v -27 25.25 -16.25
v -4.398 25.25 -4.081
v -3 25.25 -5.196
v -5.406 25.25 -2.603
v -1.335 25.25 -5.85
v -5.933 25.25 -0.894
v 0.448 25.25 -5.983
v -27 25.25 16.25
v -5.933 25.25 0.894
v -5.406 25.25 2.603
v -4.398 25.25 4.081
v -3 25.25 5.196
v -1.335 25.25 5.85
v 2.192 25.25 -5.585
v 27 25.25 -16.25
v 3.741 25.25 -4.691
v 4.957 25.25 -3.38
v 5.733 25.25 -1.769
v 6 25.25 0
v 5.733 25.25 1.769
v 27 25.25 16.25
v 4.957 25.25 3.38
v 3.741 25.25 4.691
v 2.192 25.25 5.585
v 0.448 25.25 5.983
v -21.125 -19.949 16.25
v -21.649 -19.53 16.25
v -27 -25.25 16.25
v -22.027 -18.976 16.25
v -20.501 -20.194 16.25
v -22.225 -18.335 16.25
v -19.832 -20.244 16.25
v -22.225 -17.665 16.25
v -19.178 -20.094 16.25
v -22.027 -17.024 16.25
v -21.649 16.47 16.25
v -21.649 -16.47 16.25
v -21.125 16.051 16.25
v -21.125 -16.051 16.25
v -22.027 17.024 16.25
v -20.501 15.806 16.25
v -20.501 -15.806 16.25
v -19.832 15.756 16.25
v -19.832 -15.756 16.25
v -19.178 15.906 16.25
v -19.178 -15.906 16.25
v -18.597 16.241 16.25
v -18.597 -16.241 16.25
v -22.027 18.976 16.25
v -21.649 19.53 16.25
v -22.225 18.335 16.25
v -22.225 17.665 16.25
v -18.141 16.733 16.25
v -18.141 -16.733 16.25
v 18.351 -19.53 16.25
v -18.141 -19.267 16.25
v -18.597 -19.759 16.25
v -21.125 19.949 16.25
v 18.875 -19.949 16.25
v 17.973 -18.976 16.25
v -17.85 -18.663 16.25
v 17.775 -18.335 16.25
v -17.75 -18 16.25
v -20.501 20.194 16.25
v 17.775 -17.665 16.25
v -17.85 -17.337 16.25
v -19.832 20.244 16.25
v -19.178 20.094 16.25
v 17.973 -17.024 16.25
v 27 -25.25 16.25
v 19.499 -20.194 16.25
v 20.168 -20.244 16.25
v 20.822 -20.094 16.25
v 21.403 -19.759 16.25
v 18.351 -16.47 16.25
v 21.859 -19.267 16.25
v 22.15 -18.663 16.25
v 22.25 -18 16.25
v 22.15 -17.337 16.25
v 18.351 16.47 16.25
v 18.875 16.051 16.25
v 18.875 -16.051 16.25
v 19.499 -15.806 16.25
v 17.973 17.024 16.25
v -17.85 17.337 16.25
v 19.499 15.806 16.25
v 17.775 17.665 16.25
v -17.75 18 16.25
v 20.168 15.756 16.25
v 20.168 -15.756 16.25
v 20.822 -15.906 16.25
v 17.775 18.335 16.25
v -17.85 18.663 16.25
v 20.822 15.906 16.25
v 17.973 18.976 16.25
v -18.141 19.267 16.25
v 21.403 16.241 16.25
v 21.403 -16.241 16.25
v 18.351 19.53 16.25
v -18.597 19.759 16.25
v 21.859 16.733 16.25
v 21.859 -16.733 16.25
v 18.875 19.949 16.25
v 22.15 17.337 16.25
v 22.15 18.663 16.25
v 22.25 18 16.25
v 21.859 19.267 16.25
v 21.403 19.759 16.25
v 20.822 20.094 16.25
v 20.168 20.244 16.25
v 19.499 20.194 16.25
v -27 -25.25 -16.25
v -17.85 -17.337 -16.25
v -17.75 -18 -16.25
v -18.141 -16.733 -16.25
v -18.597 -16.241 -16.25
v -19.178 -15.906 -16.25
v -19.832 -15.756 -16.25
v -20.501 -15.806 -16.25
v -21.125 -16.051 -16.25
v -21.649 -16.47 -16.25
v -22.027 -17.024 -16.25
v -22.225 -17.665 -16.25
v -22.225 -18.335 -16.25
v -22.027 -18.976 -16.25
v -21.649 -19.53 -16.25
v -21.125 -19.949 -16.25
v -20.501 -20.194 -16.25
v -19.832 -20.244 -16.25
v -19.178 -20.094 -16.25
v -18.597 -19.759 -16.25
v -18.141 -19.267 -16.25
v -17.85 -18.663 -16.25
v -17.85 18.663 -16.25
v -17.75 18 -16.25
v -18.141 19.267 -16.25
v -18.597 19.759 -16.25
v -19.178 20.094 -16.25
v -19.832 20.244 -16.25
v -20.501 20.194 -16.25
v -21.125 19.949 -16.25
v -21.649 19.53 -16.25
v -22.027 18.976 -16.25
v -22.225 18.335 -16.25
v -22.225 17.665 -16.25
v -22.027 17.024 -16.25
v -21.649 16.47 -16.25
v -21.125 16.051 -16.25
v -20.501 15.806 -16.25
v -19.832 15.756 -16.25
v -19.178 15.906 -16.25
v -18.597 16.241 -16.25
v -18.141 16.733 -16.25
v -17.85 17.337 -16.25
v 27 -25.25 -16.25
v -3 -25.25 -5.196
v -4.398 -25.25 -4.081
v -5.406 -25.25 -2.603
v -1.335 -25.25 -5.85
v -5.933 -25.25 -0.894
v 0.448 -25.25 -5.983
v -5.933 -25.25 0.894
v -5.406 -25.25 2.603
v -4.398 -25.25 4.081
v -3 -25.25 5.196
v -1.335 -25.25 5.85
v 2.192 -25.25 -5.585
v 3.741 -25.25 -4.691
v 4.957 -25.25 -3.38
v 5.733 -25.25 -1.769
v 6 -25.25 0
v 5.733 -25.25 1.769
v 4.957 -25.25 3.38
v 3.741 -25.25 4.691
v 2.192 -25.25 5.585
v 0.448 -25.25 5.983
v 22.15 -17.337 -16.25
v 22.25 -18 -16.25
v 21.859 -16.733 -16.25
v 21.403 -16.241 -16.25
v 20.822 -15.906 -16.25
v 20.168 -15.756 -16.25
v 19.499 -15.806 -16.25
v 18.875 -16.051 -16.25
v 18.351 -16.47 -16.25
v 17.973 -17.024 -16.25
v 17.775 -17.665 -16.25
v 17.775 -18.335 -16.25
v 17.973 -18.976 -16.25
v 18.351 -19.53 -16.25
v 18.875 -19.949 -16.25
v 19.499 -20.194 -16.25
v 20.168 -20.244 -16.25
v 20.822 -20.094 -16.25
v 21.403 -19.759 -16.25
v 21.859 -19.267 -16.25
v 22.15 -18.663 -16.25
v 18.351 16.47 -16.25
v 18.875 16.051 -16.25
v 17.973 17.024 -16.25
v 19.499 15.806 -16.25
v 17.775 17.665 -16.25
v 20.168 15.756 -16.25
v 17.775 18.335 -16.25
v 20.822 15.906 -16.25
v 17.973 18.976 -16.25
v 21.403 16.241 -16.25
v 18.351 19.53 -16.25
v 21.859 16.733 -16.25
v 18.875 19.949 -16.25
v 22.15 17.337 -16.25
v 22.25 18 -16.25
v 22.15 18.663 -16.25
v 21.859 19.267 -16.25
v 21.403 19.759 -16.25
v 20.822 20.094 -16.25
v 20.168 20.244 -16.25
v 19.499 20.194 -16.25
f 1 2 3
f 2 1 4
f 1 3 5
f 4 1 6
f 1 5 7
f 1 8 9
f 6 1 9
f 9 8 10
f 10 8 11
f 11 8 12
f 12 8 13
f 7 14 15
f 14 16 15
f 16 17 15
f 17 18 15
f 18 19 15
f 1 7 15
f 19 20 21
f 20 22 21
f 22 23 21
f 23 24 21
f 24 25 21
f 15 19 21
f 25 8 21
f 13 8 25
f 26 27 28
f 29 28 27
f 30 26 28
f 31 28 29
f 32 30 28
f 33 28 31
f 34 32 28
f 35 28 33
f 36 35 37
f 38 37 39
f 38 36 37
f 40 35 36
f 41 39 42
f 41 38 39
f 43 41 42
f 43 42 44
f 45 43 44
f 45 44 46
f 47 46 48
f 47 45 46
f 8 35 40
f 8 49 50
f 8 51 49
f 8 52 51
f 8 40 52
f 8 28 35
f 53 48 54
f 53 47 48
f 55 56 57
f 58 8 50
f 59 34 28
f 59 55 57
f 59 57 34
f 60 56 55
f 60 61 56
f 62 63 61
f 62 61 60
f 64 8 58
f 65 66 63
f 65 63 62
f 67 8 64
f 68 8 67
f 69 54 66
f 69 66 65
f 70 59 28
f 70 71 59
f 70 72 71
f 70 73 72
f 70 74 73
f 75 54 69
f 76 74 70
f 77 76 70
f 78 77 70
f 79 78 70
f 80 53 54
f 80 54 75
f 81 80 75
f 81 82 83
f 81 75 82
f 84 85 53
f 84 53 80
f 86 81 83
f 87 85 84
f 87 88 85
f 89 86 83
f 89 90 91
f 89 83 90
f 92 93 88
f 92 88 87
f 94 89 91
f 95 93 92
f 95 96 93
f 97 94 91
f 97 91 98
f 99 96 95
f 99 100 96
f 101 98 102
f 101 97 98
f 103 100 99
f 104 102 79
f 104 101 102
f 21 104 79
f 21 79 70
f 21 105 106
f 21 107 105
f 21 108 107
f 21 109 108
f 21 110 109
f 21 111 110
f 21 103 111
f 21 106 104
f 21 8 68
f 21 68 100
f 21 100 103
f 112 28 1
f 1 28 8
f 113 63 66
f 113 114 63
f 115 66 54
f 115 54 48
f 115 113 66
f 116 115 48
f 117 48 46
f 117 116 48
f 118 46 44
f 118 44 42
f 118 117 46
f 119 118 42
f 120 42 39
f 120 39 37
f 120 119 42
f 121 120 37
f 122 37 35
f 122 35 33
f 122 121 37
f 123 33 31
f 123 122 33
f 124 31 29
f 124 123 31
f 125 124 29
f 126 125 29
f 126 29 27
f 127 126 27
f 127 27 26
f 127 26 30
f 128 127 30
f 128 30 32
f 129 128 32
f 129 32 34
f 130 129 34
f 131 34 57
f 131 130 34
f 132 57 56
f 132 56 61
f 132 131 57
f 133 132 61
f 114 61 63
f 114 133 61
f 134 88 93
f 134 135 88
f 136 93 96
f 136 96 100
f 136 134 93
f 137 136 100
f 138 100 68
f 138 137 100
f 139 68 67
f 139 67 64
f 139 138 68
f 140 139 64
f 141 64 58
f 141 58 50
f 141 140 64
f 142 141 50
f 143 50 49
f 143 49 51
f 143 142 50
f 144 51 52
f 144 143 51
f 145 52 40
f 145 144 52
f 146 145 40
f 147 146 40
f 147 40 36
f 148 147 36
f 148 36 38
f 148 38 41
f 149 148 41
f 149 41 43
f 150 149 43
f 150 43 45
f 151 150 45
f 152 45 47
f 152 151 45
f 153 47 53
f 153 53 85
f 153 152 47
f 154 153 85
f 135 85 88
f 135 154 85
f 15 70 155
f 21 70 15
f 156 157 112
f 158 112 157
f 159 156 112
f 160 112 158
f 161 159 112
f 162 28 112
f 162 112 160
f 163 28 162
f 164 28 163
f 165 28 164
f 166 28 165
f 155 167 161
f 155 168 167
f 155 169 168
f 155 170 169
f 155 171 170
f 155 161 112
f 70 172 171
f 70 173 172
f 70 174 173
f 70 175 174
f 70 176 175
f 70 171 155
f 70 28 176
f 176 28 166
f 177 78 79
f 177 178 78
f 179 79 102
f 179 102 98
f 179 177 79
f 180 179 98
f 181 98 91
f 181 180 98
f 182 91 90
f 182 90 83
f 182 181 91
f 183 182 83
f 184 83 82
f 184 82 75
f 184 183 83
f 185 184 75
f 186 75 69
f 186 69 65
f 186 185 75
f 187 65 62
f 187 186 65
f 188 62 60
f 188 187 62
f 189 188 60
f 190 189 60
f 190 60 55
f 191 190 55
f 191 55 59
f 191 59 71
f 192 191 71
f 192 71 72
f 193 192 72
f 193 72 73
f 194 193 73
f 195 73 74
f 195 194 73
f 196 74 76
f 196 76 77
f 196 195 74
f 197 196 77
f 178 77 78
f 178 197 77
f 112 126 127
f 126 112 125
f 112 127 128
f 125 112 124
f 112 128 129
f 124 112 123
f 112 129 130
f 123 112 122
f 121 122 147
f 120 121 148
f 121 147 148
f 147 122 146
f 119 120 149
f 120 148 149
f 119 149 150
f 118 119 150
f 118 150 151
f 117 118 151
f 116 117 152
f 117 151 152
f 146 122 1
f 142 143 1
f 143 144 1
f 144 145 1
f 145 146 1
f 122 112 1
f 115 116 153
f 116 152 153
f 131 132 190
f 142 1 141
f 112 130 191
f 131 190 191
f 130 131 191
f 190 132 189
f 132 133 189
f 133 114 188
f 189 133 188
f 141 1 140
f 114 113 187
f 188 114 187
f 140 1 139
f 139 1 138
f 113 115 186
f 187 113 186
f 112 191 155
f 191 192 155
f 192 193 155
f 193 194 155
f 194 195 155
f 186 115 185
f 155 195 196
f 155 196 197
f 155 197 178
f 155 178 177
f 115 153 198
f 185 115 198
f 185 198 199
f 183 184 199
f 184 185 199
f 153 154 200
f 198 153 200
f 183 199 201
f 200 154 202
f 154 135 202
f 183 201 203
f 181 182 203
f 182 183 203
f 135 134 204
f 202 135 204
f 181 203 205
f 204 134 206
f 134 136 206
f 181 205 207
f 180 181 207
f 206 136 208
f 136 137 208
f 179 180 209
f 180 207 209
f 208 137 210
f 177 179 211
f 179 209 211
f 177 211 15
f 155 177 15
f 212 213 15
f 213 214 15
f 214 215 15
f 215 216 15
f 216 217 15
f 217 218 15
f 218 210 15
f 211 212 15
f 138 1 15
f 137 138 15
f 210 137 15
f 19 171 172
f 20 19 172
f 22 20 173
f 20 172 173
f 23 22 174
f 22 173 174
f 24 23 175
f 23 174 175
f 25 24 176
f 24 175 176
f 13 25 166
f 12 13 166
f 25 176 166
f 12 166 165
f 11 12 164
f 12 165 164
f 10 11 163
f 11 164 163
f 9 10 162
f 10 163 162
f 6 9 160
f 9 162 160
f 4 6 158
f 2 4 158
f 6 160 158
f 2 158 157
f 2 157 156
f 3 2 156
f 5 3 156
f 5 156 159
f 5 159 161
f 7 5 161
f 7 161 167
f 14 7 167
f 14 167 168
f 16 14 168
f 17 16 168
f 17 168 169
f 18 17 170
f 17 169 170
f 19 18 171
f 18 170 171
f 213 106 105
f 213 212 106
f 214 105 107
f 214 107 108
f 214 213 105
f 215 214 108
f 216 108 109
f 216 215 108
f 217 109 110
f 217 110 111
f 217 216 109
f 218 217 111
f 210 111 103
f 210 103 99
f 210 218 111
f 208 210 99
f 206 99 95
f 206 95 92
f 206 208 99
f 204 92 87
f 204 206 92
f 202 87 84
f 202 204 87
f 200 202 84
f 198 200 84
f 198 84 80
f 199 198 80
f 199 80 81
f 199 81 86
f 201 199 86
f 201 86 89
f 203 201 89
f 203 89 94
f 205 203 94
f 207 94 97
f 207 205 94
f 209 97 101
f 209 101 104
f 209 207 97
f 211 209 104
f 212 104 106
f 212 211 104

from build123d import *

# Parameters (mm, degrees)
SKETCH_W     = 54
SKETCH_H     = 50.5
SKETCH_R     = 2.25
PAD_DEPTH    = 16.25
SKETCH001_R  = 6
POCKET_DEPTH = 50.5


with BuildPart() as part:
    # Sketch → Pad (new body, symmetric)
    with BuildSketch(Plane.XY):
        Rectangle(SKETCH_W, SKETCH_H)
        with Locations((-20, 18)):
            Circle(SKETCH_R, mode=Mode.SUBTRACT)
        with Locations((-20, -18)):
            Circle(SKETCH_R, mode=Mode.SUBTRACT)
        with Locations((20, 18)):
            Circle(SKETCH_R, mode=Mode.SUBTRACT)
        with Locations((20, -18)):
            Circle(SKETCH_R, mode=Mode.SUBTRACT)
    extrude(amount=PAD_DEPTH, both=True)

    # Sketch001 → Pocket (cut)
    with BuildSketch(Plane.XZ.offset(25.25)):
        Circle(SKETCH001_R)
    extrude(amount=-POCKET_DEPTH, mode=Mode.SUBTRACT)


solid = part.part
